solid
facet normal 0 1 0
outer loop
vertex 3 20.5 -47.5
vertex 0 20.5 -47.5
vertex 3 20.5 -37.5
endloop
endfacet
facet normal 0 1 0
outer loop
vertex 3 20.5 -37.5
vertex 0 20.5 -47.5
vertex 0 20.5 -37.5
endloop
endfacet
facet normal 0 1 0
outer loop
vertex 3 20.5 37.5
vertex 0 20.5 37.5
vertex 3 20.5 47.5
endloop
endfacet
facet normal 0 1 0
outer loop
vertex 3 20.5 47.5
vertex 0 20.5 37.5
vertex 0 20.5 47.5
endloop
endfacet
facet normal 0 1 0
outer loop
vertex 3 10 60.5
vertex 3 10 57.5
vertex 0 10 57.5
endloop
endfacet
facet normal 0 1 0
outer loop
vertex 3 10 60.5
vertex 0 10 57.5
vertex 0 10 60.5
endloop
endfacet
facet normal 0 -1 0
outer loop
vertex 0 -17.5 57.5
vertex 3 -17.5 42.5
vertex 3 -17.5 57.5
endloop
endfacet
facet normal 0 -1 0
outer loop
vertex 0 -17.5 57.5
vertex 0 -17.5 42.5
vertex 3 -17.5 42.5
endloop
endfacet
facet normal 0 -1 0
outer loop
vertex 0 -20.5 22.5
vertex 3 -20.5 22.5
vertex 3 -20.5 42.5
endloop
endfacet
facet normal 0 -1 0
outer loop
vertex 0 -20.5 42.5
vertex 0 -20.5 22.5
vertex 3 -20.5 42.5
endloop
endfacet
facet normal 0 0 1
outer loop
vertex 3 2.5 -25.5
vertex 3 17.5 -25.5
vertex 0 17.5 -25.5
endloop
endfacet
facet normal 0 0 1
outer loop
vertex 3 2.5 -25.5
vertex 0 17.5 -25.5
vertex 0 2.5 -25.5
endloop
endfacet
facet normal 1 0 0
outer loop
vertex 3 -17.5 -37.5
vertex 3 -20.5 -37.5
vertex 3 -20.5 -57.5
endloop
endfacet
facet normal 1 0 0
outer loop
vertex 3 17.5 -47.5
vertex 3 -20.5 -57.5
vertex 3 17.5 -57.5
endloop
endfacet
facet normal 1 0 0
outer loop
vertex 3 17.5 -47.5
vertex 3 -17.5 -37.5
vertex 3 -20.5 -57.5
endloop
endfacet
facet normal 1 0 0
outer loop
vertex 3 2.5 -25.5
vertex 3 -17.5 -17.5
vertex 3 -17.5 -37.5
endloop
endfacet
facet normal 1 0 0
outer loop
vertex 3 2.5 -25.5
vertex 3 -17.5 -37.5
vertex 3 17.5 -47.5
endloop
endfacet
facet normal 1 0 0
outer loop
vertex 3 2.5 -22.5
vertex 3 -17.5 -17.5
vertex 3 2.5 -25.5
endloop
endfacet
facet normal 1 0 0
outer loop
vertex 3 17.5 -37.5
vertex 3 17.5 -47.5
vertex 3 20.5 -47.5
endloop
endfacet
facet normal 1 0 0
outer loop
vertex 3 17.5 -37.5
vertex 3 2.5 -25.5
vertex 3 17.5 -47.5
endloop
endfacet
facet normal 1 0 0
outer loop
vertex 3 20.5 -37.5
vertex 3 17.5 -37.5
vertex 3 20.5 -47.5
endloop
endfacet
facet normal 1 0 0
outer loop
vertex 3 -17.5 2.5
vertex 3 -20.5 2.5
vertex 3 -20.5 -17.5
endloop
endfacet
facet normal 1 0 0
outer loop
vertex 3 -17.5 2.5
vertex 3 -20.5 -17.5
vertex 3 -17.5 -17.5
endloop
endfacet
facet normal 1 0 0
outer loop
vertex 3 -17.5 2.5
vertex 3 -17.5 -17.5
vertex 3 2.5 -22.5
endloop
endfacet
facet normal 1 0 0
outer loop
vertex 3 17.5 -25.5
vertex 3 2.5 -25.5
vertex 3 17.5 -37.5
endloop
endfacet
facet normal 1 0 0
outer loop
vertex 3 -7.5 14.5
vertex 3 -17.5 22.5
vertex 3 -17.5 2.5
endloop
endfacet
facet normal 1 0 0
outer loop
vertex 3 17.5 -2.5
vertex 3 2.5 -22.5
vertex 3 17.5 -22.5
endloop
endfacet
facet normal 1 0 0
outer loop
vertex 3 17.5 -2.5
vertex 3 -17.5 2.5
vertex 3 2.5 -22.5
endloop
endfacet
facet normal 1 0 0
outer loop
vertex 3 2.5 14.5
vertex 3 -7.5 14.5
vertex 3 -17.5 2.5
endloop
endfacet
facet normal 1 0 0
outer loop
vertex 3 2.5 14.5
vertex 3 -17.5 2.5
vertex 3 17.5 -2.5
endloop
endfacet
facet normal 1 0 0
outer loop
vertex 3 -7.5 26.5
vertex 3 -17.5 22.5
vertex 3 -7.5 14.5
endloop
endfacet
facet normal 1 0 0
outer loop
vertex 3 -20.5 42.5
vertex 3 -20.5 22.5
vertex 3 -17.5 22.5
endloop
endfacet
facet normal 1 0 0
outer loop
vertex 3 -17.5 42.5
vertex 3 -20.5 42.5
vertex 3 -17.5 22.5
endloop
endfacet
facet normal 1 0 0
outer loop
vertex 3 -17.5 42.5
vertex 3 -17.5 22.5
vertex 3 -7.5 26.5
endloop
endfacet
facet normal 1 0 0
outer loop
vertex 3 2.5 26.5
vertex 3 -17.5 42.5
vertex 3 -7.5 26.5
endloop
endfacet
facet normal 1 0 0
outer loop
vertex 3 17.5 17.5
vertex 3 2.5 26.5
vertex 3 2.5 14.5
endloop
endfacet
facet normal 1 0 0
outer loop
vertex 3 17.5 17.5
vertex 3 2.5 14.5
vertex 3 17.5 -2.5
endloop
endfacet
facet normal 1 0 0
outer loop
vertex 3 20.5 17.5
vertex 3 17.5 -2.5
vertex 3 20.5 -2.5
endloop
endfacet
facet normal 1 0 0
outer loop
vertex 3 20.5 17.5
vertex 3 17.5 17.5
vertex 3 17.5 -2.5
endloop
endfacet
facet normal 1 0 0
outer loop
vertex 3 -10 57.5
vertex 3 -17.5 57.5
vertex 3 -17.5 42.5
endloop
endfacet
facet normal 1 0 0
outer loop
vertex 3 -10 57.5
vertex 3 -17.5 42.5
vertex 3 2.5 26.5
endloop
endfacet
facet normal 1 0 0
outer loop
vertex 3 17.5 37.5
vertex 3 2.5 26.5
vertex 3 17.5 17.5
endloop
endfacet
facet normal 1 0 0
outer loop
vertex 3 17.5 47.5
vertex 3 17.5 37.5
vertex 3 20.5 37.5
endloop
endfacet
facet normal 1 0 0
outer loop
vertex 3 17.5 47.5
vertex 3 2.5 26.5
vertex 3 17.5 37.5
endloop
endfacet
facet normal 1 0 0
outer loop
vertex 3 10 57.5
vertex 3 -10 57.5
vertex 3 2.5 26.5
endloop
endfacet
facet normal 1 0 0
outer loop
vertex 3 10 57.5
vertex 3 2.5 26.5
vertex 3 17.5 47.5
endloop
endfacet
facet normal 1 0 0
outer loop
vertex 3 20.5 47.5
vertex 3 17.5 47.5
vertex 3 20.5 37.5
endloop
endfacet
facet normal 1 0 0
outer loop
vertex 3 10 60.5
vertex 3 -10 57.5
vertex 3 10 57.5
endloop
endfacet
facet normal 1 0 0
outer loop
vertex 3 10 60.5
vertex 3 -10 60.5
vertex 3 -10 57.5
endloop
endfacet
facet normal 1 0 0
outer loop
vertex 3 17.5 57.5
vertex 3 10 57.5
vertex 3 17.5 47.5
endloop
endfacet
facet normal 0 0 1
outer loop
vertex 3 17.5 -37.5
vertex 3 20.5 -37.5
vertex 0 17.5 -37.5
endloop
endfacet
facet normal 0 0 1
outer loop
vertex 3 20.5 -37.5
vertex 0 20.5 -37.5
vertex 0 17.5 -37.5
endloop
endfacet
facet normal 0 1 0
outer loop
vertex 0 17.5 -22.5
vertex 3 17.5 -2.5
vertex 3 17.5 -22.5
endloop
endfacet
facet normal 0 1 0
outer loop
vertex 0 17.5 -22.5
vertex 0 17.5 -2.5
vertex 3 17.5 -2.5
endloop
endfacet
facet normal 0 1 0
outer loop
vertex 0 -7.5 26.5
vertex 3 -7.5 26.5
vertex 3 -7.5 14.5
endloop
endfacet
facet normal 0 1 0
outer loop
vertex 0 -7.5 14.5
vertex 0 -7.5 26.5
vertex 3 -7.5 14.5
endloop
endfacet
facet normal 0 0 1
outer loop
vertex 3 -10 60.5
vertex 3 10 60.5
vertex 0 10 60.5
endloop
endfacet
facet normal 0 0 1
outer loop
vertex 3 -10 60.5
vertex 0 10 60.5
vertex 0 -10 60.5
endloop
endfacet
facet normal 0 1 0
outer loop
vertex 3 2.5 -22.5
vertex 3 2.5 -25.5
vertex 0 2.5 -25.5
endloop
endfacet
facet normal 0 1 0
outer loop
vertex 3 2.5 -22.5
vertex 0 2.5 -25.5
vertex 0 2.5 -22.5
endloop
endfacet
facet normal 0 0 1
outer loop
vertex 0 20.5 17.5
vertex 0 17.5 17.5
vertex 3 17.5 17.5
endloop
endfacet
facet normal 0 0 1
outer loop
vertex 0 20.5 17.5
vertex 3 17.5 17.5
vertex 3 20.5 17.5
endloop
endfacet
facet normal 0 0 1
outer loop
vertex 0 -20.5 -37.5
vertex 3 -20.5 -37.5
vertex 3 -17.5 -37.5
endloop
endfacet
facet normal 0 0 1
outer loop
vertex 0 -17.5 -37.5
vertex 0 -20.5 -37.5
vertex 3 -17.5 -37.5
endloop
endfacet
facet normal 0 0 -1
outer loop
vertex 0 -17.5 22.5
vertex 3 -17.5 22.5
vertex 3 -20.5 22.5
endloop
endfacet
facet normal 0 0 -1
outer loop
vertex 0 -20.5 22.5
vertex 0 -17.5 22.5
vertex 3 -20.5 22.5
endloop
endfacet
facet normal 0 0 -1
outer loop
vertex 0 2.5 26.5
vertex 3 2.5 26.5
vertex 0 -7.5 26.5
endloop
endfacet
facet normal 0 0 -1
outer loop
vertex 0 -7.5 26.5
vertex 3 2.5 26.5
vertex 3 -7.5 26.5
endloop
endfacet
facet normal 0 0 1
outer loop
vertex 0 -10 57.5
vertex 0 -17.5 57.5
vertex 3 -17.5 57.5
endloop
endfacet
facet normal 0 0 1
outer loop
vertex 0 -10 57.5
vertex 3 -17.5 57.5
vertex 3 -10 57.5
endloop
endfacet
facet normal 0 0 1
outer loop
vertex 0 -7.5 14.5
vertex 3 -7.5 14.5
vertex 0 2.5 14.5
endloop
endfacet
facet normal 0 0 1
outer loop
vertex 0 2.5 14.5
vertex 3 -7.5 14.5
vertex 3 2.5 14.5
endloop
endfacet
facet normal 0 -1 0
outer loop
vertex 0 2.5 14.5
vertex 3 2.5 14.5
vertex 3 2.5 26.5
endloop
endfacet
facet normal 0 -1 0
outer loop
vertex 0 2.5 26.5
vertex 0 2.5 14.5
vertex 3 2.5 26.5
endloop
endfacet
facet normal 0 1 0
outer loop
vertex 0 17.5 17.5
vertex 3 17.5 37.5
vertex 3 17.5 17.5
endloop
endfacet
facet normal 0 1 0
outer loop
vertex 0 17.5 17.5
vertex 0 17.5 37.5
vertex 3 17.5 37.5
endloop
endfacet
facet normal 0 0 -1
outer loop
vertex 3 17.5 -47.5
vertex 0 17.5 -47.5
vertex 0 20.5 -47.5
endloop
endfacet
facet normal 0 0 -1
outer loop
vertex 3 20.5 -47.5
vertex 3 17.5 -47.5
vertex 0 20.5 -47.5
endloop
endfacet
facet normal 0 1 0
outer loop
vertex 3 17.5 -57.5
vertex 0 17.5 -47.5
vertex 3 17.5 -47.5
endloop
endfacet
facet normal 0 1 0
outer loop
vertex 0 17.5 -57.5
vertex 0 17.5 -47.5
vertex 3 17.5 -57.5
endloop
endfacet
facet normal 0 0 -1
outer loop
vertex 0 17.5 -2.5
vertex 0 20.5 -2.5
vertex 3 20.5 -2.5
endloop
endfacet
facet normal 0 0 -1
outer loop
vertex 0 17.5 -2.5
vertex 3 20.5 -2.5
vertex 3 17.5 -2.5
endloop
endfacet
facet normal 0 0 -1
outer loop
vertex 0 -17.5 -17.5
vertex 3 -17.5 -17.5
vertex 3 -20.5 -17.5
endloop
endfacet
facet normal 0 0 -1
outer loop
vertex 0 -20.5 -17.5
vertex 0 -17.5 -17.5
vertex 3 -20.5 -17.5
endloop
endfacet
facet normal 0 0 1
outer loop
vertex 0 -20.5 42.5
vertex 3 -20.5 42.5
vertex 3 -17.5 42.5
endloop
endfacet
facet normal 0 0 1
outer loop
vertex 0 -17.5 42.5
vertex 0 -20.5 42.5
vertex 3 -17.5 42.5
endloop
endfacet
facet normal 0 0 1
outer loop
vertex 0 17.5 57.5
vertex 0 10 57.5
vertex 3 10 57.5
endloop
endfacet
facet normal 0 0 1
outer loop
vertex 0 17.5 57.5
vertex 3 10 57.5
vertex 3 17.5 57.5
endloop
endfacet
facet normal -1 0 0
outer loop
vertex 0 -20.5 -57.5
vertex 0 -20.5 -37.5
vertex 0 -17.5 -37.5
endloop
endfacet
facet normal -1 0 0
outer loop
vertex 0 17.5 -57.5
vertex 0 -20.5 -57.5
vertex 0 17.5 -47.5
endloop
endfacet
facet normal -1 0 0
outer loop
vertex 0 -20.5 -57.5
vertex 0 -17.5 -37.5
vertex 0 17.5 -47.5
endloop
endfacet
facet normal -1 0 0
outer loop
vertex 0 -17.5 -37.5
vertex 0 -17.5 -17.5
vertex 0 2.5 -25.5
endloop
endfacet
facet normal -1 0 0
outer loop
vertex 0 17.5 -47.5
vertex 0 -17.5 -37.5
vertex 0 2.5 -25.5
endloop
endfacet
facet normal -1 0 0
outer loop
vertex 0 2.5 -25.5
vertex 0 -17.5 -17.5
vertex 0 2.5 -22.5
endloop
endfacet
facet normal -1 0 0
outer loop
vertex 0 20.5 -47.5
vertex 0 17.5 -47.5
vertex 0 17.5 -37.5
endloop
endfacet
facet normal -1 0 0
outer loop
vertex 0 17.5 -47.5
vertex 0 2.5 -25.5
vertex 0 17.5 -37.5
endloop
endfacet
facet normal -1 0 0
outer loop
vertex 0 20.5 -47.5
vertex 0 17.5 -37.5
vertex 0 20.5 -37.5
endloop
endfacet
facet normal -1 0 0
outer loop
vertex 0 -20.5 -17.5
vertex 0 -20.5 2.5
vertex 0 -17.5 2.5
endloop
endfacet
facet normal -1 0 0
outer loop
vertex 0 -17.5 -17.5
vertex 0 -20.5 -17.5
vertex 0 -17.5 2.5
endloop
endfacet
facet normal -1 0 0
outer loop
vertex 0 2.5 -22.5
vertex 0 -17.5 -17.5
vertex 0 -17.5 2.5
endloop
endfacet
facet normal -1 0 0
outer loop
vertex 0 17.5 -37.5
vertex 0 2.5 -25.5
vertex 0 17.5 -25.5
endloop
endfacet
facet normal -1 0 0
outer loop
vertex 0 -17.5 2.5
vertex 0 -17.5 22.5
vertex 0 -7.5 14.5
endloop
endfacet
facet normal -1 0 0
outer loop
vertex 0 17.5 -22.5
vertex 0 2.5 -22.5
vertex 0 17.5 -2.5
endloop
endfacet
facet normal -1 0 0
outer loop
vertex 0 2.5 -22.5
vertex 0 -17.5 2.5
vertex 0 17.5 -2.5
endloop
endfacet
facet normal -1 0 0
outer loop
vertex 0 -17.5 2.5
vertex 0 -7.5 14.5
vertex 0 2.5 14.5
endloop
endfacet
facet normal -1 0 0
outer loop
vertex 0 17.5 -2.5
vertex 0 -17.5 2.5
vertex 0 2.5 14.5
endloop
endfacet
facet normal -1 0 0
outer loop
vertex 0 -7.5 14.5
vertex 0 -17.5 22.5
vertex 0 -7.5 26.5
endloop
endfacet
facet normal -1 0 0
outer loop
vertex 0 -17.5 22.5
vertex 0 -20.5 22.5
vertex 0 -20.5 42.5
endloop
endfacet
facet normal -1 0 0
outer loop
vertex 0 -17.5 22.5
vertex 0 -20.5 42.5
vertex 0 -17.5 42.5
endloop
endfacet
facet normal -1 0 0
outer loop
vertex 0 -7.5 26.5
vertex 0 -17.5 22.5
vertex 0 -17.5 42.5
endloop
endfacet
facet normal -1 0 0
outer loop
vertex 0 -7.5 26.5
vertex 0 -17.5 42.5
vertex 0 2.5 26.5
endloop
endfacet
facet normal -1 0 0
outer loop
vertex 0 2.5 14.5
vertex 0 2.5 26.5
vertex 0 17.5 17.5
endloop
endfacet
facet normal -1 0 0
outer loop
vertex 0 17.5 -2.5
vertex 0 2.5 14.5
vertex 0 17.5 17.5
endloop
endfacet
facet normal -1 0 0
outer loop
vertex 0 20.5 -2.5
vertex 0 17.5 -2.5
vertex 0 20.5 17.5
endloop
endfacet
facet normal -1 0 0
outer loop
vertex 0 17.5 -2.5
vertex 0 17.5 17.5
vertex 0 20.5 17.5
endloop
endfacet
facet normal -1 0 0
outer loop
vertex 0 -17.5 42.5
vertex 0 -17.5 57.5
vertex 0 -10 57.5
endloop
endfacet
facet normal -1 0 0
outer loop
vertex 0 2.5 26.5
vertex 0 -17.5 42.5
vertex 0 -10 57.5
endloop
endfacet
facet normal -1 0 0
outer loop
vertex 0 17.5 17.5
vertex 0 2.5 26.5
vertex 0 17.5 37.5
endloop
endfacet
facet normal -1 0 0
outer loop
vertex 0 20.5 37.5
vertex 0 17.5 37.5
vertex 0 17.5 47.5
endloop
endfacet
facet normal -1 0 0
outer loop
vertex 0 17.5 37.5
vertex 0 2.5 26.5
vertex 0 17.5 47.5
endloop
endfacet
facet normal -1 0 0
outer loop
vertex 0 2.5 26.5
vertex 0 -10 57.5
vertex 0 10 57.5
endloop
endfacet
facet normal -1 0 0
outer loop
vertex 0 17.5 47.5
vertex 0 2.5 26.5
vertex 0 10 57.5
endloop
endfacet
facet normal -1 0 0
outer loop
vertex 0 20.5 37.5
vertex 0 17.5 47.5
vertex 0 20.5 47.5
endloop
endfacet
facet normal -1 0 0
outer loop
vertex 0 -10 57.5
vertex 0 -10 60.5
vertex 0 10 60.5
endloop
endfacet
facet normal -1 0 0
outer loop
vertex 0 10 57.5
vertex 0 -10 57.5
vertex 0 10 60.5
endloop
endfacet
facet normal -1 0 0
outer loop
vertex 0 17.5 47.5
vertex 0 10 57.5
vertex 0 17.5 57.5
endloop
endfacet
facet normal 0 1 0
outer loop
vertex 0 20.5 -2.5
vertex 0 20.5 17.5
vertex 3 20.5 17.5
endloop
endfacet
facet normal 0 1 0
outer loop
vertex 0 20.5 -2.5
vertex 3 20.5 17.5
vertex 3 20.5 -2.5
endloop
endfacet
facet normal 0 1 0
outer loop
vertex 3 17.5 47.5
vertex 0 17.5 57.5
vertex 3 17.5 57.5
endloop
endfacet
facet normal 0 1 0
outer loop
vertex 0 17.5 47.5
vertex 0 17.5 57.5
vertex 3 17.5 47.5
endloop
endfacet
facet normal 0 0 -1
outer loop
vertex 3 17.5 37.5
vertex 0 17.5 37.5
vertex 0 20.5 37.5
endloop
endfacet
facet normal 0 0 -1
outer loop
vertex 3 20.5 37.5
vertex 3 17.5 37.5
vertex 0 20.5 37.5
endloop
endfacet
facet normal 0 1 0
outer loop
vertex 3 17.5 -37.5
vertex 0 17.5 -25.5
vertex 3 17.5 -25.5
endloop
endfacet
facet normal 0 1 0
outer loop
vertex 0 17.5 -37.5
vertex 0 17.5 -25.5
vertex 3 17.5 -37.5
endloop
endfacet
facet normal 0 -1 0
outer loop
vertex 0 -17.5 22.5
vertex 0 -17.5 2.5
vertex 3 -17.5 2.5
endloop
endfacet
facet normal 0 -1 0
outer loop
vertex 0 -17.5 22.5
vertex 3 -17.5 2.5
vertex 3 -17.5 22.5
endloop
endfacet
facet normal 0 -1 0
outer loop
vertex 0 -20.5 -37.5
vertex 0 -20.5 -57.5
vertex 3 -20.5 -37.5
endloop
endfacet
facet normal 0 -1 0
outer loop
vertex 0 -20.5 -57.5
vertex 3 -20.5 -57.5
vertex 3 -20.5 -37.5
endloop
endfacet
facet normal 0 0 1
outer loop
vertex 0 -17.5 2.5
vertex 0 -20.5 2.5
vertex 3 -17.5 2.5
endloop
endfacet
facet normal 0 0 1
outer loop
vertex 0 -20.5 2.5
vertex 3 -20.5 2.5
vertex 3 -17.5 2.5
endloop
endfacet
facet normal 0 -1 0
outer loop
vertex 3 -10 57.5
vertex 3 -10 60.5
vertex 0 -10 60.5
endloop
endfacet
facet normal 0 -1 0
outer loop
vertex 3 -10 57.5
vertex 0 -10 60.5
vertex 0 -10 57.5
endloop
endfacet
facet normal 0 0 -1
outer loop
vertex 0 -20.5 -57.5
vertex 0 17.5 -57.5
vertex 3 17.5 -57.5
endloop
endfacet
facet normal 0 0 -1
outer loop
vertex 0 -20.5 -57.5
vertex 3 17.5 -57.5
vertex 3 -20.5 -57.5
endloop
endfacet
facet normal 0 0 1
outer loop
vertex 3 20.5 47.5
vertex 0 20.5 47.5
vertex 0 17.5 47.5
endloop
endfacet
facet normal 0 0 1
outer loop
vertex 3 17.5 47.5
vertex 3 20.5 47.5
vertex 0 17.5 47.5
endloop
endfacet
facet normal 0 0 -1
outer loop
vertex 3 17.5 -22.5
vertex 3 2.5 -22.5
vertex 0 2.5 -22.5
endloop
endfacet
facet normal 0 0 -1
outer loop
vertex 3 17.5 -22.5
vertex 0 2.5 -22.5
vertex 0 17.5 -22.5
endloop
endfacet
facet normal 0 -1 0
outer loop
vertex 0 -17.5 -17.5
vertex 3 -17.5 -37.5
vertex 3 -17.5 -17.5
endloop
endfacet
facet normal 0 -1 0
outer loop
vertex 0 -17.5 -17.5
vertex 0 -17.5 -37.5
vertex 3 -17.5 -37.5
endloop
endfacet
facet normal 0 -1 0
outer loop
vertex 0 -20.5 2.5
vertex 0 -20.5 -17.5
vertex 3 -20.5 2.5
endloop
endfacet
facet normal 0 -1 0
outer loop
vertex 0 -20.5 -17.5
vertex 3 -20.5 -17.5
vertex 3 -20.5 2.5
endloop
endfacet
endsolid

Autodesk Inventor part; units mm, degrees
ref_plane "YZ Plane" through (0, 0, 0) normal (1, 0, 0) x (0, 1, 0)
ref_plane "XZ Plane" through (0, 0, 0) normal (0, 1, 0) x (-1, 0, 0)
ref_plane "XY Plane" through (0, 0, 0) normal (0, 0, 1) x (1, 0, 0)
sketch "Sketch1" plane through (0, 0, 0) normal (1, 0, 0) x (0, 1, 0)
  line L0 (-17.5, 57.5) -> (17.5, 57.5)
  line L1 (17.5, 57.5) -> (17.5, -57.5)
  line L2 (17.5, -57.5) -> (-17.5, -57.5)
  line L3 (-17.5, -57.5) -> (-17.5, 57.5)
  line L4 (-17.5, 57.5) -> (17.5, -57.5) construction
  line L5 (17.5, 57.5) -> (-17.5, -57.5) construction
  point P0 (0, 0)
  dimension "d0" = 35
  dimension "d1" = 115
extrude "Extrusion1" add sketch "Sketch1" along normal blind 3
sketch "Sketch2" plane through (3, 0, 0) normal (1, 0, 0) x (0, 0, -1)
  line L0 (-57.5, -17.5) -> (57.5, -17.5) projected
  line L1 (-42.5, -17.5) -> (-22.5, -17.5)
  line L2 (-22.5, -17.5) -> (-22.5, -20.5)
  line L3 (-22.5, -20.5) -> (-42.5, -20.5)
  line L4 (-42.5, -20.5) -> (-42.5, -17.5)
  line L5 (-57.5, 17.5) -> (-57.5, -17.5) projected
  line L6 (-2.5, -17.5) -> (17.5, -17.5)
  line L7 (17.5, -17.5) -> (17.5, -20.5)
  line L8 (17.5, -20.5) -> (-2.5, -20.5)
  line L9 (-2.5, -20.5) -> (-2.5, -17.5)
  line L10 (37.5, -17.5) -> (57.5, -17.5)
  line L11 (57.5, -17.5) -> (57.5, -20.5)
  line L12 (57.5, -20.5) -> (37.5, -20.5)
  line L13 (37.5, -20.5) -> (37.5, -17.5)
  point P0 (0, 0)
  dimension "d4" = 20
  dimension "d5" = 3
  dimension "d6" = 15
  dimension "d7" = 20
  dimension "d8" = 3
  dimension "d9" = 20
  dimension "d10" = 20
  dimension "d11" = 3
  dimension "d12" = 20
extrude "Extrusion2" add sketch "Sketch2" against normal blind 3
sketch "Sketch3" plane through (3, 0, 0) normal (1, 0, 0) x (0, 0, -1)
  line L0 (-57.5, -17.5) -> (-57.5, 17.5) projected
  line L1 (-57.5, 10) -> (-60.5, 10)
  line L2 (-60.5, 10) -> (-60.5, -10)
  line L3 (-60.5, -10) -> (-57.5, -10)
  line L4 (-57.5, -10) -> (-57.5, 10)
  point P0 (0, 0)
  point P1 (-60.5, 0)
  dimension "d15" = 3
  dimension "d16" = 20
extrude "Extrusion3" add sketch "Sketch3" against normal blind 3
sketch "Sketch4" plane through (3, 0, 0) normal (1, 0, 0) x (0, 0, -1)
  line L0 (-26.5, -7.5) -> (-14.5, -7.5)
  line L1 (-14.5, -7.5) -> (-14.5, 2.5)
  line L2 (-14.5, 2.5) -> (-26.5, 2.5)
  line L3 (-26.5, 2.5) -> (-26.5, -7.5)
  line L4 (-26.5, -7.5) -> (-14.5, 2.5) construction
  line L5 (-14.5, -7.5) -> (-26.5, 2.5) construction
  circle A0 centre (-20.5, -2.5) radius 2 projected
  point P0 (0, 0)
  point P1 (-20.5, -2.5)
  dimension "d19" = 12
  dimension "d20" = 10
extrude "Extrusion4" cut sketch "Sketch4" against normal blind 3 contours L3 L2 L1 L0 | A0
sketch "Sketch5" plane through (3, 0, 0) normal (1, 0, 0) x (0, 0, -1)
  line L0 (-57.5, 17.5) -> (57.5, 17.5) projected
  line L1 (22.5, 17.5) -> (25.5, 17.5)
  line L2 (25.5, 17.5) -> (25.5, 2.5)
  line L3 (25.5, 2.5) -> (22.5, 2.5)
  line L4 (22.5, 2.5) -> (22.5, 17.5)
  line L5 (-57.5, 17.5) -> (-57.5, 10) projected
  point P0 (0, 0)
  dimension "d23" = 3
  dimension "d24" = 15
  dimension "d25" = 80
extrude "Extrusion5" cut sketch "Sketch5" against normal blind 3
sketch "Sketch6" plane through (0, 0, 0) normal (-1, 0, 0) x (0, 0, 1)
  line L0 (-22.5, 17.5) -> (57.5, 17.5) projected
  line L1 (47.5, 17.5) -> (37.5, 17.5)
  line L2 (37.5, 17.5) -> (37.5, 20.5)
  line L3 (37.5, 20.5) -> (47.5, 20.5)
  line L4 (47.5, 20.5) -> (47.5, 17.5)
  line L5 (57.5, 10) -> (57.5, 17.5) projected
  line L6 (-2.5, 17.5) -> (17.5, 17.5)
  line L7 (17.5, 17.5) -> (17.5, 20.5)
  line L8 (17.5, 20.5) -> (-2.5, 20.5)
  line L9 (-2.5, 20.5) -> (-2.5, 17.5)
  line L10 (-25.5, 17.5) -> (-57.5, 17.5) projected
  line L11 (-37.5, 17.5) -> (-47.5, 17.5)
  line L12 (-47.5, 17.5) -> (-47.5, 20.5)
  line L13 (-47.5, 20.5) -> (-37.5, 20.5)
  line L14 (-37.5, 20.5) -> (-37.5, 17.5)
  point P0 (0, 0)
  dimension "d28" = 10
  dimension "d29" = 3
  dimension "d30" = 10
  dimension "d31" = 20
  dimension "d32" = 3
  dimension "d33" = 20
  dimension "d34" = 10
  dimension "d35" = 3
  dimension "d36" = 35
extrude "Extrusion6" add sketch "Sketch6" against normal blind 3
properties part number "Motor support plate"
